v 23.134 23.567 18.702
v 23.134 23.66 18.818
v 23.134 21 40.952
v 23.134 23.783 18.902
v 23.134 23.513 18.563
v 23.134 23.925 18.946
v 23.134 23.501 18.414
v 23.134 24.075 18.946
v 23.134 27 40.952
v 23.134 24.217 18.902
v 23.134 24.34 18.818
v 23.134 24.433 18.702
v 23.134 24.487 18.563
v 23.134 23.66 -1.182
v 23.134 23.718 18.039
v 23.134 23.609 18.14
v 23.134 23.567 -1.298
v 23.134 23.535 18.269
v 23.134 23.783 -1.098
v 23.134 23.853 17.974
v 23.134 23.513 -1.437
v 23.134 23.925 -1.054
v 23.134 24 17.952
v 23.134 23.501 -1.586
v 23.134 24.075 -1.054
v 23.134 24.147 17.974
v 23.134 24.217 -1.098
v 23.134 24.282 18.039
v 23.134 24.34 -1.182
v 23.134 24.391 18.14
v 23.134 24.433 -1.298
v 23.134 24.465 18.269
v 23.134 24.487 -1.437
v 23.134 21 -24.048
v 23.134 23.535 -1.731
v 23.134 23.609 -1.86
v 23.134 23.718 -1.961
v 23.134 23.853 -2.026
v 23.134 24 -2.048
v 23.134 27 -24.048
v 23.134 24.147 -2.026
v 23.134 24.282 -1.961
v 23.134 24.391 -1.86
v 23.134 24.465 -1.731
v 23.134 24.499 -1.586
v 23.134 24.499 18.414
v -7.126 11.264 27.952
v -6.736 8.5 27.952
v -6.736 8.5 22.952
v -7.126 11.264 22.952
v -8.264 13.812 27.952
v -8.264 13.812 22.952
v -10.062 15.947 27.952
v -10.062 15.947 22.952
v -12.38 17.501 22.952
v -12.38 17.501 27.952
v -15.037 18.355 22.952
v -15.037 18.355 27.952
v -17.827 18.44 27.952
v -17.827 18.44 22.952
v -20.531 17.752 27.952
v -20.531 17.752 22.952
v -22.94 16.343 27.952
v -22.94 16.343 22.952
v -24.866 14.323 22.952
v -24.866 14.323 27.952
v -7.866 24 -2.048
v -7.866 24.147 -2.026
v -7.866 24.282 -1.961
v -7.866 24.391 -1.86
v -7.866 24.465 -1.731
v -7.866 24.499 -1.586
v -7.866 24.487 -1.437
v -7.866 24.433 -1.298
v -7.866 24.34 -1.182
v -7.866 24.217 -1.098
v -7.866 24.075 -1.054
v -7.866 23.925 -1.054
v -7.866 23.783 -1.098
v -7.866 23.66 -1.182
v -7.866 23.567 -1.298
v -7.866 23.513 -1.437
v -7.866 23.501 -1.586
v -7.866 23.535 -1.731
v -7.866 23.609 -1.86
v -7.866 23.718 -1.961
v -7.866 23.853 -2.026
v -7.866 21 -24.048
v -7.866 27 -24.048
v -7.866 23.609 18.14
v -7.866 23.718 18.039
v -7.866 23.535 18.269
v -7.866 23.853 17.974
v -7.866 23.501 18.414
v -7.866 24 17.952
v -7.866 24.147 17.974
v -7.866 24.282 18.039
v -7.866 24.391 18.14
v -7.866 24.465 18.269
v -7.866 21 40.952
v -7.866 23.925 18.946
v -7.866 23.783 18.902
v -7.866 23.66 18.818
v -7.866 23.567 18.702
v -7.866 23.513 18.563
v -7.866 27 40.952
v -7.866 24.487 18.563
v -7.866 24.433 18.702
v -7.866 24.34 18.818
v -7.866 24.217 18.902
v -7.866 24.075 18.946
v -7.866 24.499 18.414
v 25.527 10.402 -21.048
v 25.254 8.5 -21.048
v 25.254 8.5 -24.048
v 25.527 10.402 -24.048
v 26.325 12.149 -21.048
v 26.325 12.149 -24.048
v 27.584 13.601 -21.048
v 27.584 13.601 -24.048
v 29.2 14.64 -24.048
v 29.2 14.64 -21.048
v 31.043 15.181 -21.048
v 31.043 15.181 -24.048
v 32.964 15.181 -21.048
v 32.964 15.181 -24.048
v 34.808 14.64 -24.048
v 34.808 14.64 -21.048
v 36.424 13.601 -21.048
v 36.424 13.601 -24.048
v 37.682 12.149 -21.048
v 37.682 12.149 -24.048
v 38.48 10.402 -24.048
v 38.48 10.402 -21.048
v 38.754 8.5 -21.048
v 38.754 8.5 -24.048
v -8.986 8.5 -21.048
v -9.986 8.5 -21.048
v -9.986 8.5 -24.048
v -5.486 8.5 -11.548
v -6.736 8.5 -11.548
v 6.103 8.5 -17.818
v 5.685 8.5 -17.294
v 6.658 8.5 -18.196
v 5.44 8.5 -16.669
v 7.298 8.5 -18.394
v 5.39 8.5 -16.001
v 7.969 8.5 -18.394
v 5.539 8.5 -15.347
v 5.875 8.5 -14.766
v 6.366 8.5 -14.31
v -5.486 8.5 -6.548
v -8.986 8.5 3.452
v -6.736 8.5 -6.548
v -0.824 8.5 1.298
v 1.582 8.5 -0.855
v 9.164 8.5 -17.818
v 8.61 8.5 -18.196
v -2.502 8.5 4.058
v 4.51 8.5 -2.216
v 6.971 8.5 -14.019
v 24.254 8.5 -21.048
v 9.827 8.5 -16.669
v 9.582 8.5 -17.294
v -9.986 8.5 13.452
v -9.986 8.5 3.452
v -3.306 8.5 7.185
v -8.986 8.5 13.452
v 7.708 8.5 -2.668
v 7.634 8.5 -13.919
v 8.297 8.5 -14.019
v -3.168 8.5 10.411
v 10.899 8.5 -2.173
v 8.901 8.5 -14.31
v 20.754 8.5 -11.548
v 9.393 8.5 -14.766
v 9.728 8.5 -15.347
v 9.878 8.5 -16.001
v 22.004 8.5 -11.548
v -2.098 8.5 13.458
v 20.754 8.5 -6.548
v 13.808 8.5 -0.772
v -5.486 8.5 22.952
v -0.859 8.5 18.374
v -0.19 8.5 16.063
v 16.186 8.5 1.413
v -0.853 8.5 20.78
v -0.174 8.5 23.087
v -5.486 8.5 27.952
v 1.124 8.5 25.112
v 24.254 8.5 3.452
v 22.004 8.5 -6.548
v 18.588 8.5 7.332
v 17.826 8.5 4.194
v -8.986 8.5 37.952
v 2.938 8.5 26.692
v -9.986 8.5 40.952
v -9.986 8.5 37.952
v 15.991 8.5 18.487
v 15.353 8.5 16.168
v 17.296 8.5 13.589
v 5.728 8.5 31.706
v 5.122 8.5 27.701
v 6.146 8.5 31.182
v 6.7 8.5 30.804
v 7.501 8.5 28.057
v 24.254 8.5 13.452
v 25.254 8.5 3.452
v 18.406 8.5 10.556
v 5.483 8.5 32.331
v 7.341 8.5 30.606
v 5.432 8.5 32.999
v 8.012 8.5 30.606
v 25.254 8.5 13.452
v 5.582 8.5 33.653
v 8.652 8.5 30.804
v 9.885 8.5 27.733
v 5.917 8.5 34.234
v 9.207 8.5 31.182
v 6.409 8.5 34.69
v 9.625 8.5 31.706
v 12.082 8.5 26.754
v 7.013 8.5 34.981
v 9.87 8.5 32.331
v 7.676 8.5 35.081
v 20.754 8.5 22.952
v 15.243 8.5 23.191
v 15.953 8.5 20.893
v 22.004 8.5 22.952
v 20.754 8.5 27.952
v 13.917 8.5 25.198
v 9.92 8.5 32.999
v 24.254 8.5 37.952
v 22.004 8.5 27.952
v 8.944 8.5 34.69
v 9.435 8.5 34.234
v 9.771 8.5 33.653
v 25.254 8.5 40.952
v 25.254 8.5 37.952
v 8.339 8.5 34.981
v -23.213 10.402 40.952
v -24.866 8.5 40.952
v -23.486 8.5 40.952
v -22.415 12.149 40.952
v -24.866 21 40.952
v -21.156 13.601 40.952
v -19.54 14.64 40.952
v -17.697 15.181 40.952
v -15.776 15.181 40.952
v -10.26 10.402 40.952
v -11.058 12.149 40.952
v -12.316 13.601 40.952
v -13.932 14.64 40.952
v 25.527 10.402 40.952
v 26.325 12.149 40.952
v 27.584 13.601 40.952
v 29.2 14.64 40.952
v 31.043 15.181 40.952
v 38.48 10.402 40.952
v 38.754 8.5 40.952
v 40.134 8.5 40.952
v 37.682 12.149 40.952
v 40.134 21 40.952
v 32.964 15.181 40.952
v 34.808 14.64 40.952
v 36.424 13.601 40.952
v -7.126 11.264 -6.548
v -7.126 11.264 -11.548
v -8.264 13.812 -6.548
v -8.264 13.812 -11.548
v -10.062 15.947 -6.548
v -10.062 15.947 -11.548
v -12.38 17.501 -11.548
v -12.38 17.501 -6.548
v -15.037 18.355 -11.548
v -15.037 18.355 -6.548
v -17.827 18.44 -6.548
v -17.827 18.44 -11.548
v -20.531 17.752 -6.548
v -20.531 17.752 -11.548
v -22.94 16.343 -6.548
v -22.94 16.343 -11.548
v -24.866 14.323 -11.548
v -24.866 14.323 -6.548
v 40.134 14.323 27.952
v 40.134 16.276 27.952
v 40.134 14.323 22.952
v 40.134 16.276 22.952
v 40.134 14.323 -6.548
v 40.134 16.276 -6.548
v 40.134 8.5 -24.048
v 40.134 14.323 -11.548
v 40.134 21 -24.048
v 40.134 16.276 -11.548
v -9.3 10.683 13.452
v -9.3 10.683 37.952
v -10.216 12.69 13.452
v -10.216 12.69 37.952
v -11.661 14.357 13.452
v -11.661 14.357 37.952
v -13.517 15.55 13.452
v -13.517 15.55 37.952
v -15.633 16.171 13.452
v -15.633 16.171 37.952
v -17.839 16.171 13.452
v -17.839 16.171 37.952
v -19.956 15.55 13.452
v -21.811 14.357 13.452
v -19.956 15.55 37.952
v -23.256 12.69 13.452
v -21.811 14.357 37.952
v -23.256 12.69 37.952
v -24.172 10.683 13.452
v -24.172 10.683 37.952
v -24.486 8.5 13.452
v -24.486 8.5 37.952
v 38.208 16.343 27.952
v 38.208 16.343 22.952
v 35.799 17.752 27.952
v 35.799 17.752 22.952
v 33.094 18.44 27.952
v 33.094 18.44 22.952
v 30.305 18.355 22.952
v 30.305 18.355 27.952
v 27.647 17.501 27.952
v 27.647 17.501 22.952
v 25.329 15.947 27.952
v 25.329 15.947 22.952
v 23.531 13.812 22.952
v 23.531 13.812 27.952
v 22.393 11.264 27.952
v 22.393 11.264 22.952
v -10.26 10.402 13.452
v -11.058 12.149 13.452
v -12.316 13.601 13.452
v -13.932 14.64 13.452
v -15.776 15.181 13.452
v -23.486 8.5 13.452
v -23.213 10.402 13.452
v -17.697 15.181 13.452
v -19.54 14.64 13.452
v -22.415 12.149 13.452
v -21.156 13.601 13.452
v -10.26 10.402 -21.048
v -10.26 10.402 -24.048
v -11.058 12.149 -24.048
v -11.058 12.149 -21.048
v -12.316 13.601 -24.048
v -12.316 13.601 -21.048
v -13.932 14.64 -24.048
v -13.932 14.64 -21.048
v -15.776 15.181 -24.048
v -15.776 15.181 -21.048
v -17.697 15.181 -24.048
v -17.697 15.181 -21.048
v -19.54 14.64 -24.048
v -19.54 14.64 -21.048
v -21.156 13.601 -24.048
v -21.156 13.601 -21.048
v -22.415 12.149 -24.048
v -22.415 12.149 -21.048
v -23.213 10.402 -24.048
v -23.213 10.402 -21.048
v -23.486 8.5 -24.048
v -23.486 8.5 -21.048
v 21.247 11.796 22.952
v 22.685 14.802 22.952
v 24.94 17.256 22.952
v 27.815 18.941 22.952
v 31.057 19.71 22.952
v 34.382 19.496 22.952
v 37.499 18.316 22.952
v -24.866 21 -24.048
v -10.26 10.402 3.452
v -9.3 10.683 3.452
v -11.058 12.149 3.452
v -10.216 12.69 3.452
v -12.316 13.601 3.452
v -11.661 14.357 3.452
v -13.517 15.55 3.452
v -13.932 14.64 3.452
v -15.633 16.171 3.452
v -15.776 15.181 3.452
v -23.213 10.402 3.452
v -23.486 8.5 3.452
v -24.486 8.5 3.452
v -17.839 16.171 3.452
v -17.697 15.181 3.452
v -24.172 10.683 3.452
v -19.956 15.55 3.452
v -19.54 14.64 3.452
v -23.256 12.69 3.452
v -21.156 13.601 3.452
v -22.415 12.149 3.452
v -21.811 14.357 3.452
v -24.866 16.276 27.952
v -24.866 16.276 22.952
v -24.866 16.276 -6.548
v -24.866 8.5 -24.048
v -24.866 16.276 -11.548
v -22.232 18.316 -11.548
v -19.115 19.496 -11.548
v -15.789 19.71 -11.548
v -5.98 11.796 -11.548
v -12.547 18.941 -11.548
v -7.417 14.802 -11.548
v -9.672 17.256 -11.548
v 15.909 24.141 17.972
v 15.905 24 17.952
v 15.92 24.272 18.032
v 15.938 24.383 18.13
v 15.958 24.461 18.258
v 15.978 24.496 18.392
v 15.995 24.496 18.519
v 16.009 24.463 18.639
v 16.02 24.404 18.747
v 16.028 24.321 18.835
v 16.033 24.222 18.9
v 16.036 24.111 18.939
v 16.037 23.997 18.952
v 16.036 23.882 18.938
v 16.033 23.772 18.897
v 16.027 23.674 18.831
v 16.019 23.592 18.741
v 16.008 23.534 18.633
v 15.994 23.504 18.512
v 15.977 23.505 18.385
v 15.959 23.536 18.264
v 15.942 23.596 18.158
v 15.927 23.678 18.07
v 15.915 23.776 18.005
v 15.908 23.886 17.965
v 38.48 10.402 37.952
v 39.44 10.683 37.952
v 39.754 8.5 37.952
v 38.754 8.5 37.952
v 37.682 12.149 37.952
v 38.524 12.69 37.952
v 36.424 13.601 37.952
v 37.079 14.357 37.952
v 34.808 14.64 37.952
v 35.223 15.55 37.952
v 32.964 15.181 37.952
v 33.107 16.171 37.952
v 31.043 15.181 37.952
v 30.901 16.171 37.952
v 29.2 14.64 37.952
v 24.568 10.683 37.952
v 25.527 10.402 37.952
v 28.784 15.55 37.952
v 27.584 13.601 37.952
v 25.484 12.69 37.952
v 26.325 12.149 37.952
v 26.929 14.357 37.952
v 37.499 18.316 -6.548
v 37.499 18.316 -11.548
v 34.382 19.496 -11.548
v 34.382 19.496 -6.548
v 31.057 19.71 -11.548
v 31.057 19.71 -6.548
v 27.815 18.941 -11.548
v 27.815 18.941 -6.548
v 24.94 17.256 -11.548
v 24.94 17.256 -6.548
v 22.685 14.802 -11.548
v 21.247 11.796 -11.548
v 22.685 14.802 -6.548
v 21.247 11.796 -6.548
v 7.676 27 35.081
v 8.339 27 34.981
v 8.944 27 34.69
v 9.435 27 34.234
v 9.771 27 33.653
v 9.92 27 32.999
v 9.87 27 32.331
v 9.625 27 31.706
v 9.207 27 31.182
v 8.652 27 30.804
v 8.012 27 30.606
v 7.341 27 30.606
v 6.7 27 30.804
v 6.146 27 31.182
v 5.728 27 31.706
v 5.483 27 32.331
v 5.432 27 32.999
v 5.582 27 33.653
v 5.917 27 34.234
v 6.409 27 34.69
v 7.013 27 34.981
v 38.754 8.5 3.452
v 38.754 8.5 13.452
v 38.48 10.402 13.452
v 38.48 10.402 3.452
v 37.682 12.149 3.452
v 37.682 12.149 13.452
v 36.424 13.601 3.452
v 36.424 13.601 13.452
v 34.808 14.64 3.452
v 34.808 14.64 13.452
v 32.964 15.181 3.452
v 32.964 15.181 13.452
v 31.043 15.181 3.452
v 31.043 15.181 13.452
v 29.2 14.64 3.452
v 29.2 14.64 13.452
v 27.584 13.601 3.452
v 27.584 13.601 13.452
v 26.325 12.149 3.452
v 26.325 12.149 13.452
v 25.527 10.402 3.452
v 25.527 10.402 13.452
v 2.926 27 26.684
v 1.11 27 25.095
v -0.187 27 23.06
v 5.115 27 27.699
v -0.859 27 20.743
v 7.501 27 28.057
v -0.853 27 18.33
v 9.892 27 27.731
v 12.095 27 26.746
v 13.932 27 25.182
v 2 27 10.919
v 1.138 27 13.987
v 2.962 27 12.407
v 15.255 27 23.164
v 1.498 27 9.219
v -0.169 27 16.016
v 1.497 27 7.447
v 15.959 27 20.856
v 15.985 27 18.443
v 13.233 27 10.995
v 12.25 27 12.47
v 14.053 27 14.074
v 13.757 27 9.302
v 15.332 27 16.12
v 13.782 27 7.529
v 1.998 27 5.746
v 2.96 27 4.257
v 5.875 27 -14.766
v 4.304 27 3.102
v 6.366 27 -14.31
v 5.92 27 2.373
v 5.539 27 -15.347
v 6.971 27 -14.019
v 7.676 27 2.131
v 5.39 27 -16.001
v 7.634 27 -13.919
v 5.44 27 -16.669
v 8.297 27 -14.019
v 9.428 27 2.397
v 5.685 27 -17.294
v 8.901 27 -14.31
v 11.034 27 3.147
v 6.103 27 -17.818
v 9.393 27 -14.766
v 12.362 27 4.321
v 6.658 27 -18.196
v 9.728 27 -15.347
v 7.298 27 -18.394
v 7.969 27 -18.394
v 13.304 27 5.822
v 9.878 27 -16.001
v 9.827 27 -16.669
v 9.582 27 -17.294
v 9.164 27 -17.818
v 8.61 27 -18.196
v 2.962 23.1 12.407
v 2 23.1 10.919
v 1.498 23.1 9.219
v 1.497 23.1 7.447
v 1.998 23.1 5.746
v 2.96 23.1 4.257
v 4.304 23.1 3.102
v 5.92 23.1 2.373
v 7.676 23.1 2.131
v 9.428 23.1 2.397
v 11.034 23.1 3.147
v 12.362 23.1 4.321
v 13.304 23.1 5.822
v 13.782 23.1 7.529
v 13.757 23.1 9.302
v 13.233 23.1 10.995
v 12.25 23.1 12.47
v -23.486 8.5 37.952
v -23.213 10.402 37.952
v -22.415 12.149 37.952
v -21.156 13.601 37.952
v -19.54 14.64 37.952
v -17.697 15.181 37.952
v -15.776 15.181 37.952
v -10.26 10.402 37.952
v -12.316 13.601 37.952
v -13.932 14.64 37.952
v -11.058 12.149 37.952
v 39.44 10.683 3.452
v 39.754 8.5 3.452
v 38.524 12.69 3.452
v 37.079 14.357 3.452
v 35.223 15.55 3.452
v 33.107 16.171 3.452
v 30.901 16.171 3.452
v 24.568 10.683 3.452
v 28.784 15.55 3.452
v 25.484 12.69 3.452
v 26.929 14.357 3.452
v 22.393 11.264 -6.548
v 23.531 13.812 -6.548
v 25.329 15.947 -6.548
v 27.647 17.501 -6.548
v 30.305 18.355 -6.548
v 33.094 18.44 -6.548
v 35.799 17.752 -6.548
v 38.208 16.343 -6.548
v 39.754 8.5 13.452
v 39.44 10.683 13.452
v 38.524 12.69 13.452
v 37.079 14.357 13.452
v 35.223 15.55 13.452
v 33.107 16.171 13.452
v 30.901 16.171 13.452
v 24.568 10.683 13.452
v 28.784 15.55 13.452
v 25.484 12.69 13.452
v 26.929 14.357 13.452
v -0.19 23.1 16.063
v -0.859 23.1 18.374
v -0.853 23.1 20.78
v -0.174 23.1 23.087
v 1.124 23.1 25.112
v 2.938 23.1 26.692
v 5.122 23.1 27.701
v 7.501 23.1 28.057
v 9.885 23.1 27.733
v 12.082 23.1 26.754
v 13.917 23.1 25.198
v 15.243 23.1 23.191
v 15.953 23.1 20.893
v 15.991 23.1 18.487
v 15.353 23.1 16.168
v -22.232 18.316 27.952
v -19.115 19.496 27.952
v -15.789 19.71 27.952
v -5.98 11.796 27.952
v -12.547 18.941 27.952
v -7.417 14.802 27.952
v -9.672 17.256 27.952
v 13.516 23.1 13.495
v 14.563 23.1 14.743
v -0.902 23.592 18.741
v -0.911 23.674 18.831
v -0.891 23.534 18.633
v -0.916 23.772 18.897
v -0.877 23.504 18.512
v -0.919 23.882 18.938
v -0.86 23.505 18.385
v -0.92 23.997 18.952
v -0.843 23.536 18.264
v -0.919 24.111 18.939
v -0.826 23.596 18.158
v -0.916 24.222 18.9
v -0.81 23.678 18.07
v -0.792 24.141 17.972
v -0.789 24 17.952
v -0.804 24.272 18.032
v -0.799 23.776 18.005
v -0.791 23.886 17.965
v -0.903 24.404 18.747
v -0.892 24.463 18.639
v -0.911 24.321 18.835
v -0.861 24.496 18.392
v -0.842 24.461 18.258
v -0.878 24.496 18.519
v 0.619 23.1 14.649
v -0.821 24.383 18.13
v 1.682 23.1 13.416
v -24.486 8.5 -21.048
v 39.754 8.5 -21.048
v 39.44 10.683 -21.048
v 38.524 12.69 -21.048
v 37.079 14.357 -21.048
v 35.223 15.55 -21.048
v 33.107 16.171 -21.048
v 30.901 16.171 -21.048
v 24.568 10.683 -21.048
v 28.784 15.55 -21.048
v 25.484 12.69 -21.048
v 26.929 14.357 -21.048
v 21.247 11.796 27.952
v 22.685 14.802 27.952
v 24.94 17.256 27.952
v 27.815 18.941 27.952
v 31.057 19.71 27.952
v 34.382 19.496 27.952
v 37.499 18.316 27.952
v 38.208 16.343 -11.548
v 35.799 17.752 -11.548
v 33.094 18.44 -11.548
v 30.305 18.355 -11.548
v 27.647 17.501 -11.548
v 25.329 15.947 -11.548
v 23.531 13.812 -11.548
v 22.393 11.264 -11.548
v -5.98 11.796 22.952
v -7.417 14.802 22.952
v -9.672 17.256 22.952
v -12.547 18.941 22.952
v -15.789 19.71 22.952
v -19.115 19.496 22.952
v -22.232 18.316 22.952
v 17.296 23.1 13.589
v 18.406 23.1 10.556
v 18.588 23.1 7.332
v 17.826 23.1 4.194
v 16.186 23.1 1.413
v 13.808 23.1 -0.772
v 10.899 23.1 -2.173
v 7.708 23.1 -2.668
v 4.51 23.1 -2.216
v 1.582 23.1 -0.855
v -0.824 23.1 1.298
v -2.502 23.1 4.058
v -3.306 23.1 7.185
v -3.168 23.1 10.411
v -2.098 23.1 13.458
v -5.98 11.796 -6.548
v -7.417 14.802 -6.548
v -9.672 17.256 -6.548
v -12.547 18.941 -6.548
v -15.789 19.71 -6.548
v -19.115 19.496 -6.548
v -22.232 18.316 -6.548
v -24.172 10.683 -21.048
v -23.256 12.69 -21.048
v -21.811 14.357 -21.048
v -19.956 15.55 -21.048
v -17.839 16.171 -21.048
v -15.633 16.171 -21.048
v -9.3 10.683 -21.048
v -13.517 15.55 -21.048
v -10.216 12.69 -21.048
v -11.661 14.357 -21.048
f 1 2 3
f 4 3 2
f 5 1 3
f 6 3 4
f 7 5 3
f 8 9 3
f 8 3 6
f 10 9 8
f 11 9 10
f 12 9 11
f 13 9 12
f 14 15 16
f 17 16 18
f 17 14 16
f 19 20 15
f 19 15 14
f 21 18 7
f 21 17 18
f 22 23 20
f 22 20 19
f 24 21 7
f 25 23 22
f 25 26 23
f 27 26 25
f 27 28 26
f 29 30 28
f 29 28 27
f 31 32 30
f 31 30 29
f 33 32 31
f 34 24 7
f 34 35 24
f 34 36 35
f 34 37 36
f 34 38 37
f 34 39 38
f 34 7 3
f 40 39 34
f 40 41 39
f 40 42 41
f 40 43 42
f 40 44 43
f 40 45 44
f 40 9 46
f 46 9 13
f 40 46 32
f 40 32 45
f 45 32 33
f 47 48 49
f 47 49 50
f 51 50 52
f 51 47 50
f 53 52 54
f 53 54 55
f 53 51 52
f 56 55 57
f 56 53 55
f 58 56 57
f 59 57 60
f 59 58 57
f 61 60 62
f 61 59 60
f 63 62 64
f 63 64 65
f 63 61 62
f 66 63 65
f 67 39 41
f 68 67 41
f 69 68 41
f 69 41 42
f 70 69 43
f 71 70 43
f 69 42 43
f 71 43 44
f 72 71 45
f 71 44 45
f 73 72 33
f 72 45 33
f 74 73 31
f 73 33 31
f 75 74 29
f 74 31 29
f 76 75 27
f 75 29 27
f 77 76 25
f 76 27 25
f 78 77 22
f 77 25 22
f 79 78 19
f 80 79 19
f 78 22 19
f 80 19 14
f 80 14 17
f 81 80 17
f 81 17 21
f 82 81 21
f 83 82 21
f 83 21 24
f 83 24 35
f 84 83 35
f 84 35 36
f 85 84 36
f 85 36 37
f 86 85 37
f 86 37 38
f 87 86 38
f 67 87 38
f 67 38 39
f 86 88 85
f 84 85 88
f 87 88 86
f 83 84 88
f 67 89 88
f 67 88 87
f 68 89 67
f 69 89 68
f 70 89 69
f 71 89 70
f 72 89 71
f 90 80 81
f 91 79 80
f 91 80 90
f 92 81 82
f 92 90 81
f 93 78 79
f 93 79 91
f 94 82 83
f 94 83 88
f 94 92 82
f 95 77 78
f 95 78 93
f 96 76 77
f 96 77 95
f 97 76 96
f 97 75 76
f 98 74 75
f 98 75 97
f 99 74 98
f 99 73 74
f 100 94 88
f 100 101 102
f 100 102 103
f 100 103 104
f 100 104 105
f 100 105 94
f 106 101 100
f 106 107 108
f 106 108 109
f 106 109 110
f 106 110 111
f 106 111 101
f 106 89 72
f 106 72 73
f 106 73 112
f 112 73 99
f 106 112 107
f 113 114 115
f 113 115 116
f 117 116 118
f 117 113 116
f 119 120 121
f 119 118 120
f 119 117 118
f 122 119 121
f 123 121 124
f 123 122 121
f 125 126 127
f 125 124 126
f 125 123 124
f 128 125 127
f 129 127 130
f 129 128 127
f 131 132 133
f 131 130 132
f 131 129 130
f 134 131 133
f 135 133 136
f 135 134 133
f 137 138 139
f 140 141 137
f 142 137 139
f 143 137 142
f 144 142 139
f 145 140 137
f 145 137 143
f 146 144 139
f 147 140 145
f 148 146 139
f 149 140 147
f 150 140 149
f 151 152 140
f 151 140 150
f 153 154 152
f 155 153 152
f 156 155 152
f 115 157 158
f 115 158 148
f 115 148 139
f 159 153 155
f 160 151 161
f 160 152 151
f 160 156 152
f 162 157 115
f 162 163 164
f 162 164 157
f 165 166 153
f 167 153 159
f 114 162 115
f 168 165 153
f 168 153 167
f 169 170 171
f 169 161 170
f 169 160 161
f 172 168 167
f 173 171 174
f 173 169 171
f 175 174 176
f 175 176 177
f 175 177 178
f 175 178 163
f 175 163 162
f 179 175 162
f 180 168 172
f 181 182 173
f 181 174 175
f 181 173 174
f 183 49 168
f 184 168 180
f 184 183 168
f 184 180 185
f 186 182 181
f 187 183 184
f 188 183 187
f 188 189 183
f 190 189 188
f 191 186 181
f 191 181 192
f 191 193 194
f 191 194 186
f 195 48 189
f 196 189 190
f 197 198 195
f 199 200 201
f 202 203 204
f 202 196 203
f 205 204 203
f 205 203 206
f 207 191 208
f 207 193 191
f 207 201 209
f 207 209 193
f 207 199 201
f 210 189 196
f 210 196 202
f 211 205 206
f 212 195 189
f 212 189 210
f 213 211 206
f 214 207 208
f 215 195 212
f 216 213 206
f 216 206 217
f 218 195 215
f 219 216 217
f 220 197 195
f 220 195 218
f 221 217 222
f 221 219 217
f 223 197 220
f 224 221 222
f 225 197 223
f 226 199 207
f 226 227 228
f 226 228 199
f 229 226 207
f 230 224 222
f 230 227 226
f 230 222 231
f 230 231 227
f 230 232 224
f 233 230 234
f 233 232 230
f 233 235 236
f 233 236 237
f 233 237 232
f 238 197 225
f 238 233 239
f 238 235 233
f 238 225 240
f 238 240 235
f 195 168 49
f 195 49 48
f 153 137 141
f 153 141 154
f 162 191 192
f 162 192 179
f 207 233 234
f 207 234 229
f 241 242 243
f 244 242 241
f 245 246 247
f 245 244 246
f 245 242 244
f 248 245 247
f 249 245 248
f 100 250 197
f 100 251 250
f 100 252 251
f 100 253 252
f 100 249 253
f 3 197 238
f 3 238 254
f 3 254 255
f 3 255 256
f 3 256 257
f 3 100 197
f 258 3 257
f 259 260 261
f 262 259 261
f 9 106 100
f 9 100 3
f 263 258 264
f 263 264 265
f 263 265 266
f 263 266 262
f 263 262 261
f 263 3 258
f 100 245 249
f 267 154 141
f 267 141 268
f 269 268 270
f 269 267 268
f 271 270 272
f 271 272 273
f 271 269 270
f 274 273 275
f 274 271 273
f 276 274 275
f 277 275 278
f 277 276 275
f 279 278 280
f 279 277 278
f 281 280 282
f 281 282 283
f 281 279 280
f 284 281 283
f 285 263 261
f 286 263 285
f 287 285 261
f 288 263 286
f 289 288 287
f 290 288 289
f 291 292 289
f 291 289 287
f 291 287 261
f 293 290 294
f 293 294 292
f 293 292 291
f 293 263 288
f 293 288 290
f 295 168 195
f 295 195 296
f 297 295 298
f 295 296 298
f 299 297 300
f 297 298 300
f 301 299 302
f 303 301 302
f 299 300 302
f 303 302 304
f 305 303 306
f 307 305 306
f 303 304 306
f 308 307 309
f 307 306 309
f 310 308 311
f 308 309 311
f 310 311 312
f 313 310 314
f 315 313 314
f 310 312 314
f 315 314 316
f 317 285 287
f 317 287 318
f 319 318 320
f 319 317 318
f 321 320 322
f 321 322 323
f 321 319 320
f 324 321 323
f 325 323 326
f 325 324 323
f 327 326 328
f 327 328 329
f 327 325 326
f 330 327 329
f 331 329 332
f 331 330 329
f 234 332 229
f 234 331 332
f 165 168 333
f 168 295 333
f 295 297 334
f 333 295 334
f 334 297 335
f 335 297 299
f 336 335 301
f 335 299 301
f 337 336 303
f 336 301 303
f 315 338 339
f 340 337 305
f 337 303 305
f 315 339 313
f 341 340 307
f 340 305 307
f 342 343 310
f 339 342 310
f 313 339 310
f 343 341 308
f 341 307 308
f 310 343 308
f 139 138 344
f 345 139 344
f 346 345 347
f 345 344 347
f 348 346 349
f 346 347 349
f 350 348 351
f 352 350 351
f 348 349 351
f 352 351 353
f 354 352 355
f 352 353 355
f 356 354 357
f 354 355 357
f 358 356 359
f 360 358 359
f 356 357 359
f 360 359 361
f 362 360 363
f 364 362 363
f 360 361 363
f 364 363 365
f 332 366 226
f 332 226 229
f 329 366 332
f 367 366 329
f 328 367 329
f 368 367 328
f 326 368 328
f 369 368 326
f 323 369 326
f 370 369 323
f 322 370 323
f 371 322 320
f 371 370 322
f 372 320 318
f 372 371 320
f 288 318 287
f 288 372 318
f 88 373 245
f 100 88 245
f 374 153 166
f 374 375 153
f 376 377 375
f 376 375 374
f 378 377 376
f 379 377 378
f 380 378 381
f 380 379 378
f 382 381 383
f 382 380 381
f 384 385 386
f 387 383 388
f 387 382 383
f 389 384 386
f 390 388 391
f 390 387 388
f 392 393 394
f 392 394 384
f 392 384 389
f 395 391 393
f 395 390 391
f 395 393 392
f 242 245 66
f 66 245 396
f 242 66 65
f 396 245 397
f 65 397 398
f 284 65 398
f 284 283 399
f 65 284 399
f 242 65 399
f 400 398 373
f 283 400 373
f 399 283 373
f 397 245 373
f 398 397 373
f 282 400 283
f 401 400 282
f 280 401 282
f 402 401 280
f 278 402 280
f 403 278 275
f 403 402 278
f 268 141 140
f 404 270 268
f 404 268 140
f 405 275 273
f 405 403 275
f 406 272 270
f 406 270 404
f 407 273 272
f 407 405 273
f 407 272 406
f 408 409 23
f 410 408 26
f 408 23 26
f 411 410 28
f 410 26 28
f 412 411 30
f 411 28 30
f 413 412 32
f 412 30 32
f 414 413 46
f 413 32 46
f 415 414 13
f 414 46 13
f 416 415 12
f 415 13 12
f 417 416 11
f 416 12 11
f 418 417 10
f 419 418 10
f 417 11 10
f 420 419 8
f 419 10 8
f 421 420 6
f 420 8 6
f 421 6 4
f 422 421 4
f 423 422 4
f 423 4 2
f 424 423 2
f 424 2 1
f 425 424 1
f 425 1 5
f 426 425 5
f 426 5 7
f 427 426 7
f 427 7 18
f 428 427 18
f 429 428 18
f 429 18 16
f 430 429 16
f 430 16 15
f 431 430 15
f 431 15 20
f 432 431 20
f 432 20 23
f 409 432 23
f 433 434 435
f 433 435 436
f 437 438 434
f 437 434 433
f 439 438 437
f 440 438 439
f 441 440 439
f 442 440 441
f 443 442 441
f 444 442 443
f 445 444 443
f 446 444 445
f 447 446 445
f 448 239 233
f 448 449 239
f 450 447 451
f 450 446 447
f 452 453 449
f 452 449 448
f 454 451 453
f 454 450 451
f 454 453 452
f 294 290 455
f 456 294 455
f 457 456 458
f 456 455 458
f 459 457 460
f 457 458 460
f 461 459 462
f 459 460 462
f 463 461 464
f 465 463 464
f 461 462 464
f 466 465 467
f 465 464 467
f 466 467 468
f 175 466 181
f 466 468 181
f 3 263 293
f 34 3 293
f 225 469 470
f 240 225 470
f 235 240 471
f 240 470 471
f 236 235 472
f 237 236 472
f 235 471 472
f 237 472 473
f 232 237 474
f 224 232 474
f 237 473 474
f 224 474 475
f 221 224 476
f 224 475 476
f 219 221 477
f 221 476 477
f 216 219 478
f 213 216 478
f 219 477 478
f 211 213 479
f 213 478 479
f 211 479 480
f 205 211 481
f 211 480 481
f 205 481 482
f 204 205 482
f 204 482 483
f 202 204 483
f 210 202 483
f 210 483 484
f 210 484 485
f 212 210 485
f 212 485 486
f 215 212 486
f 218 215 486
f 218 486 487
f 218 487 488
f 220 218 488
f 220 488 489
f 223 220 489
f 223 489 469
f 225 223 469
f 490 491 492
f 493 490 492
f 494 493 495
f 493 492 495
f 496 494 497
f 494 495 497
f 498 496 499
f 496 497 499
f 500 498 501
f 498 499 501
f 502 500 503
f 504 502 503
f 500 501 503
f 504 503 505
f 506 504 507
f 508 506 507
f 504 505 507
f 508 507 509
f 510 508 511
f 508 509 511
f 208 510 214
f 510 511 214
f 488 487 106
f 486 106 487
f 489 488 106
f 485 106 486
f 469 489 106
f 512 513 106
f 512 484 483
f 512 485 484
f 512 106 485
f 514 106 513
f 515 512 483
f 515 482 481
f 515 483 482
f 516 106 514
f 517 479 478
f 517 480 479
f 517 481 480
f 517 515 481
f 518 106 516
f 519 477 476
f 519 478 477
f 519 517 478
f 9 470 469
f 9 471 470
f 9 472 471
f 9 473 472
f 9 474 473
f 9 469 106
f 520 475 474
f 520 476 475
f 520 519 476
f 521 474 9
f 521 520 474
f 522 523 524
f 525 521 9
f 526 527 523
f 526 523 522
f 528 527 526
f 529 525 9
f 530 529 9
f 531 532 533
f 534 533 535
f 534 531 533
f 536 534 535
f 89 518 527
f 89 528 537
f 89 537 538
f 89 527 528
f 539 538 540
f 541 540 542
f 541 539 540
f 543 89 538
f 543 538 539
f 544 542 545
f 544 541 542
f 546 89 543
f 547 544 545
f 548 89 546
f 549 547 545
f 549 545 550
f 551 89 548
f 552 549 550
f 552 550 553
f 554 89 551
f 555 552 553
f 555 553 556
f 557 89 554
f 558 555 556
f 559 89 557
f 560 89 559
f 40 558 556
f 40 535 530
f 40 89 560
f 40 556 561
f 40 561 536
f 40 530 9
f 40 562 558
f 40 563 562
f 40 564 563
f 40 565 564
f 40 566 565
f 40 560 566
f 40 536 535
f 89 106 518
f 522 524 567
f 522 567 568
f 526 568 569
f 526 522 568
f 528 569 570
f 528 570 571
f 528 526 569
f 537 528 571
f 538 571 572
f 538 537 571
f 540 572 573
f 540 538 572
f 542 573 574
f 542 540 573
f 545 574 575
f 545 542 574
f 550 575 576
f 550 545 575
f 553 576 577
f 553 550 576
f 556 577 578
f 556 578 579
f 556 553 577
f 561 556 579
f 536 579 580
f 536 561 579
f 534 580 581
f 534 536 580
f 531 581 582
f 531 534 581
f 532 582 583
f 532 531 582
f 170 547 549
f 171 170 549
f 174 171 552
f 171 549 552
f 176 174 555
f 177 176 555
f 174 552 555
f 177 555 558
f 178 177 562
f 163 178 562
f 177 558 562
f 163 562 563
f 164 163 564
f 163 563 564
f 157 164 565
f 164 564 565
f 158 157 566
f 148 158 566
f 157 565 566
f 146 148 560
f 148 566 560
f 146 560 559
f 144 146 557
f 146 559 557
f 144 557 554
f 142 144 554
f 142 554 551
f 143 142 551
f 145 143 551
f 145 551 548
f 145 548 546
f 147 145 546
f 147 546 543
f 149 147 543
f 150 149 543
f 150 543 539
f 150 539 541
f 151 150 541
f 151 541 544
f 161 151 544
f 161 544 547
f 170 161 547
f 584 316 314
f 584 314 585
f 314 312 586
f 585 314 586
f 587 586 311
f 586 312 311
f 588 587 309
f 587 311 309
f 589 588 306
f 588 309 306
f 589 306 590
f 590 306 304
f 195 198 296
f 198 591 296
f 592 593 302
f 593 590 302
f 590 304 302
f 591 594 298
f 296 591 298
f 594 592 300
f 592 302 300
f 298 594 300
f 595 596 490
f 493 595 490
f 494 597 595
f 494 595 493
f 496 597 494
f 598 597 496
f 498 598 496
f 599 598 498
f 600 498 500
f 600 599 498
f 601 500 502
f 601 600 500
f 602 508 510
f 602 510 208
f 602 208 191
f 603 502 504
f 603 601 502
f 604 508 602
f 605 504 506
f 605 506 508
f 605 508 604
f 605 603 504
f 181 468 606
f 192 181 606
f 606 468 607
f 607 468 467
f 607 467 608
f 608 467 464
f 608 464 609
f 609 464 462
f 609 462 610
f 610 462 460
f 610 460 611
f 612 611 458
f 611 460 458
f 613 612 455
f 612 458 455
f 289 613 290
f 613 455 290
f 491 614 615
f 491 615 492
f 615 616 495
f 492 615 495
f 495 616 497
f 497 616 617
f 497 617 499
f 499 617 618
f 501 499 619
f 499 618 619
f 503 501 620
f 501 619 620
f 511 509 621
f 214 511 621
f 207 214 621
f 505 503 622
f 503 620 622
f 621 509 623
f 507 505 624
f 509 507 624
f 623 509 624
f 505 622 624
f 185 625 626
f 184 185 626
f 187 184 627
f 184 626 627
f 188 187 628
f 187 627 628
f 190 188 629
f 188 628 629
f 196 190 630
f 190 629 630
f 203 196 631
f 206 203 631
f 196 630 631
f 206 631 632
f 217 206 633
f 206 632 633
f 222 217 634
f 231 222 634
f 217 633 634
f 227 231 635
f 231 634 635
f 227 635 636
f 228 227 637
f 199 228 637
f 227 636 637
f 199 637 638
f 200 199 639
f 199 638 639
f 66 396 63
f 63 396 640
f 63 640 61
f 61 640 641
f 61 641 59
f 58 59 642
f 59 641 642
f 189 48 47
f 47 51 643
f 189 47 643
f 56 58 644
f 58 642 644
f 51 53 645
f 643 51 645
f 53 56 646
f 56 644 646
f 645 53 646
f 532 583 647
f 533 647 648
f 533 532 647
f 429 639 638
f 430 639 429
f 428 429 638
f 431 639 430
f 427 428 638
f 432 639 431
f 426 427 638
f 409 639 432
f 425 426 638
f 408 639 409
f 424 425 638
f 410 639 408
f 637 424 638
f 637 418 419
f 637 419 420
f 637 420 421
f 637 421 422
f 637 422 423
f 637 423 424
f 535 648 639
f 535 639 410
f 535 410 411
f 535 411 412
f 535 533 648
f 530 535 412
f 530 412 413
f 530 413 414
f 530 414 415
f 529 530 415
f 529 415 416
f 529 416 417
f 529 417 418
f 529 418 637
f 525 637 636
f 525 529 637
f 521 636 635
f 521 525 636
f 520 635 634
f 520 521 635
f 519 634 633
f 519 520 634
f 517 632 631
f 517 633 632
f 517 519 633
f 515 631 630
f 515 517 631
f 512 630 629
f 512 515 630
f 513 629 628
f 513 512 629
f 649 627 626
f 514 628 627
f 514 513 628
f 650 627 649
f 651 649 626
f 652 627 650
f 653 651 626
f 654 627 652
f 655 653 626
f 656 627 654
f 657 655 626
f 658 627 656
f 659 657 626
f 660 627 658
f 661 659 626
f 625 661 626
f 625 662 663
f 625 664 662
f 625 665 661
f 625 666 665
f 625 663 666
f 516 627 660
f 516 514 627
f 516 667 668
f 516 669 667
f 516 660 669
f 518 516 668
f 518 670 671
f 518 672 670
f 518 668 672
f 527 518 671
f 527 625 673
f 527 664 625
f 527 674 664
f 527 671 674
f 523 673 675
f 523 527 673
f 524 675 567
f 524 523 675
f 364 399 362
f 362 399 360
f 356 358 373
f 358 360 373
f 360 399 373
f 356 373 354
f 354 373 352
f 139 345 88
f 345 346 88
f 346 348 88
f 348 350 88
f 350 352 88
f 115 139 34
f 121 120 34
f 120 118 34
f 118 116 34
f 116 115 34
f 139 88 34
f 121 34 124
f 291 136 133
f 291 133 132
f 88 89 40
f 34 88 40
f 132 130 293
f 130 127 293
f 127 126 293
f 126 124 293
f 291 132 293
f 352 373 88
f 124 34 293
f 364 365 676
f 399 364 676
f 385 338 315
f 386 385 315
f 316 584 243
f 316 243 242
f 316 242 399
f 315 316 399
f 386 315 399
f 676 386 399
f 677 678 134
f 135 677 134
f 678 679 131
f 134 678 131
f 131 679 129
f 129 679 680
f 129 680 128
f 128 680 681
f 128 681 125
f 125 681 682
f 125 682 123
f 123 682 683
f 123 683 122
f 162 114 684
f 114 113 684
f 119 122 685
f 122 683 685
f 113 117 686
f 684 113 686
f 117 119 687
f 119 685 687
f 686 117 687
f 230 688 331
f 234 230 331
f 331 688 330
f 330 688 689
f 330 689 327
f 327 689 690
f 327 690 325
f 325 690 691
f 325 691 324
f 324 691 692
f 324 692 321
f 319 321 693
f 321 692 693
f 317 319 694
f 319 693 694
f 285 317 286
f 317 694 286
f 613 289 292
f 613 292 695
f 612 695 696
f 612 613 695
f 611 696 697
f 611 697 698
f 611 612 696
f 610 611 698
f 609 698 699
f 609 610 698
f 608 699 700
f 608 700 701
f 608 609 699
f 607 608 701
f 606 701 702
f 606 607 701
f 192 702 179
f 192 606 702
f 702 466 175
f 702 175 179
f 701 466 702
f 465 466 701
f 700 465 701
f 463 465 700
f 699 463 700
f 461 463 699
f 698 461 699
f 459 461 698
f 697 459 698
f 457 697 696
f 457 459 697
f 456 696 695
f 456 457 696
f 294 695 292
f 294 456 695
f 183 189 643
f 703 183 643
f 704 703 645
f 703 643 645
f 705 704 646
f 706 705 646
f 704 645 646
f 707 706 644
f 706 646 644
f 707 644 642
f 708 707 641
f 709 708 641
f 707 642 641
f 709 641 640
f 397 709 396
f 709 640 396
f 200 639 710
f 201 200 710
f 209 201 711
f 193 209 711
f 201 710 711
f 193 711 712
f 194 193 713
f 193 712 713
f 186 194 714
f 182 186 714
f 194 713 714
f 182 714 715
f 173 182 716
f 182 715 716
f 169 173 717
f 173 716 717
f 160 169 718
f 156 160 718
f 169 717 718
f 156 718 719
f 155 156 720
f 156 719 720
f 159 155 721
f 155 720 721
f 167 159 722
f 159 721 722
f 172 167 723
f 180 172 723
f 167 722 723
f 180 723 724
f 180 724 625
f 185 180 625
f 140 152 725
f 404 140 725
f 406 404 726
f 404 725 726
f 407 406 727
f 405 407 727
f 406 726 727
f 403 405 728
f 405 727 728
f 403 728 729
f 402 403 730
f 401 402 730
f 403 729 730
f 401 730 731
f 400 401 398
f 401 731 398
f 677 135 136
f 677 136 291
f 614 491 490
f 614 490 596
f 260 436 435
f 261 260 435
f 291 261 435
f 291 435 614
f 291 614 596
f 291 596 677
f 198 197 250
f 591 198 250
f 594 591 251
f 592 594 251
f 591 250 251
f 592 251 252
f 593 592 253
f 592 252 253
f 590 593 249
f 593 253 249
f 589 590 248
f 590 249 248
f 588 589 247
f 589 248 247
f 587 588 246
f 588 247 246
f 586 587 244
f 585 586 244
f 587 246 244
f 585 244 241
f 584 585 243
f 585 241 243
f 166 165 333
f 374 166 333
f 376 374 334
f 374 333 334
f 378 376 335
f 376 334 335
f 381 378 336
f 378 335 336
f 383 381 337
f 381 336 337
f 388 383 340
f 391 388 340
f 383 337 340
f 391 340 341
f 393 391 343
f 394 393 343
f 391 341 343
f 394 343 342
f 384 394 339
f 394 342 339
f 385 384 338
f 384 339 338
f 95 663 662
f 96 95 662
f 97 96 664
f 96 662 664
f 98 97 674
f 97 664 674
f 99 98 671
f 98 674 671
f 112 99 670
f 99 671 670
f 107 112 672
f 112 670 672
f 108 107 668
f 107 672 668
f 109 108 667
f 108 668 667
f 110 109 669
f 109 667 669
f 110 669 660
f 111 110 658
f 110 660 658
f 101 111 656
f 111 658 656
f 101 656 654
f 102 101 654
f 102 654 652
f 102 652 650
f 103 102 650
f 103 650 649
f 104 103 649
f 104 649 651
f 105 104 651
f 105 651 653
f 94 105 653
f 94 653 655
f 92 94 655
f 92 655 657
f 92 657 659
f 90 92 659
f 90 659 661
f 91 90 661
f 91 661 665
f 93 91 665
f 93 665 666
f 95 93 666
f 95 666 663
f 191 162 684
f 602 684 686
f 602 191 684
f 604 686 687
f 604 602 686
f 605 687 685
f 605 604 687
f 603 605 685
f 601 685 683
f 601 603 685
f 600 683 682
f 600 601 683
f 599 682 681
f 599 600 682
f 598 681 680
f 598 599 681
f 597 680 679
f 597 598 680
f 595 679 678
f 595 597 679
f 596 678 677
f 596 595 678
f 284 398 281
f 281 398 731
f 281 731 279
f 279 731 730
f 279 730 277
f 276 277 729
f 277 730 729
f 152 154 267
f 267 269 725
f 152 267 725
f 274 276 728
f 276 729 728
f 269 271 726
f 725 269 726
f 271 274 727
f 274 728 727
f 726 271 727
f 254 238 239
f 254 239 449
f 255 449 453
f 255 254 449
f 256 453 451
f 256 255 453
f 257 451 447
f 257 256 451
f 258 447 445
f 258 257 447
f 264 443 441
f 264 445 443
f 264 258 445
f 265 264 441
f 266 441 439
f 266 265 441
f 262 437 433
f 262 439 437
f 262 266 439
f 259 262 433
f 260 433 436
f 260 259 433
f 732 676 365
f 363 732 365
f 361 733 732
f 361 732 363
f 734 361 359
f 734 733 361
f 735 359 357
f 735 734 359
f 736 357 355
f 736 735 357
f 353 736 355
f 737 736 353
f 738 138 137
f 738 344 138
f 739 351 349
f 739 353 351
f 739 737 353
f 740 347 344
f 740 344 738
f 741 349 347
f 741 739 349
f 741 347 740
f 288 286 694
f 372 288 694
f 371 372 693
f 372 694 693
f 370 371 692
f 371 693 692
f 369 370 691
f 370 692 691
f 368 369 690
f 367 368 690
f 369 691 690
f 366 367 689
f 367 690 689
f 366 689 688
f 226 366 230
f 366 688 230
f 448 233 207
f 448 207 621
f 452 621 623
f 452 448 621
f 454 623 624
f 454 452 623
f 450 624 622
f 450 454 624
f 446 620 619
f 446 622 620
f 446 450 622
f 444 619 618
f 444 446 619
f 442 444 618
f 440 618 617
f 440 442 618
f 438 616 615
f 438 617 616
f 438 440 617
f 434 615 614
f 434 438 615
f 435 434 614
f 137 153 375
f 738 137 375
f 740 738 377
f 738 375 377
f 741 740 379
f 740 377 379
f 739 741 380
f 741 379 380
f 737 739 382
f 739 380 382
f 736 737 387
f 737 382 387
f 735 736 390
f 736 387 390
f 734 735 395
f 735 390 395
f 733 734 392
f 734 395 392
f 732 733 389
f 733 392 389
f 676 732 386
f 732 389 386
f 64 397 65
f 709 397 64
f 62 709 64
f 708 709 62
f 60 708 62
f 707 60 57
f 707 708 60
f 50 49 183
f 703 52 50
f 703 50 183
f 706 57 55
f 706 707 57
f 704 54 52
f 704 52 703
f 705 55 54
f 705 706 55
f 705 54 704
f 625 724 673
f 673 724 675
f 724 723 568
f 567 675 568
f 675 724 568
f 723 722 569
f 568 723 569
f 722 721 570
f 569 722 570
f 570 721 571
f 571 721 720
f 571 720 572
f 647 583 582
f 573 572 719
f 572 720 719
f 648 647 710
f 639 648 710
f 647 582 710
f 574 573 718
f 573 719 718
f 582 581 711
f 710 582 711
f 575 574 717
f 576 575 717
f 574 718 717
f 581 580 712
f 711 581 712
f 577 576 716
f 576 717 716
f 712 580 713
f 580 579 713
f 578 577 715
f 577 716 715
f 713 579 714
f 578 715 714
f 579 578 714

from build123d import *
from build123d.topology import SkipClean

# Parameters (mm, degrees)
SKETCH_1_W           = 65
SKETCH_1_H           = 65
EXTRUDE_1_DEPTH      = 17
CUT_EXTRUDE_1_DEPTH  = 59
CUT_EXTRUDE_2_DEPTH  = 79.260612028
EXTRUDE_2_DEPTH      = 10
SKETCH_12_W          = 35.24
SKETCH_12_H          = 8.5
CUT_EXTRUDE_5_DEPTH  = 79.260612028
SKETCH_17_R          = 2.25
CUT_EXTRUDE_8_DEPTH  = 58.965697588
EXTRUDE_START        = 10
SKETCH_18_W          = 65
SKETCH_18_H          = 65
SKETCH_18_R          = 2.25
EXTRUDE_3_DEPTH      = 10
CUT_EXTRUDE_START    = -10
SKETCH_9_R           = 11.25
SKETCH_9_R_2         = 10
CUT_EXTRUDE_3_DEPTH  = 5
CUT_EXTRUDE_START_2  = -20
SKETCH_10_R          = 11.25
SKETCH_10_R_2        = 10
CUT_EXTRUDE_4_DEPTH  = 5
SKETCH_19_W          = 65
SKETCH_19_H          = 6
CUT_EXTRUDE_9_DEPTH  = 17
SKETCH_20_W          = 65
SKETCH_20_H          = 6
CUT_EXTRUDE_10_DEPTH = 17
SKETCH_21_R          = 0.5
CUT_EXTRUDE_11_DEPTH = 69.629794564
CUT_EXTRUDE_12_DEPTH = 3.9
CUT_EXTRUDE_13_DEPTH = 60.168674963


with BuildPart() as part:
    # Эскиз1 → Бобышка-Вытянуть1 (new body)
    with BuildSketch(Plane(origin=(0, 0, 0), x_dir=(1, 0, 0), z_dir=(0, 1, 0))):
        with Locations((7.633818594, -8.451785088)):
            Rectangle(SKETCH_1_W, SKETCH_1_H)
    extrude(amount=EXTRUDE_1_DEPTH)

    # Эскиз3 → Вырез-Вытянуть1 (cut)
    with BuildSketch(Plane.XY.offset(37.951785088)):
        with BuildLine():
            Line((39.753818594, 8.5), (40.133818594, 8.5))
            Line((40.133818594, 8.5), (40.133818594, 0))
            Line((40.133818594, 0), (24.253818594, 0))
            Line((24.253818594, 0), (24.253818594, 8.5))
            ThreePointArc((24.253818594, 8.5), (32.003818594, 16.25), (39.753818594, 8.5))
        make_face()
        with BuildLine():
            Line((-24.486181406, 8.5), (-24.866181406, 8.5))
            Line((-24.866181406, 8.5), (-24.866181406, 0))
            Line((-24.866181406, 0), (-8.986181406, 0))
            Line((-8.986181406, 0), (-8.986181406, 8.5))
            ThreePointArc((-8.986181406, 8.5), (-16.736181406, 16.25), (-24.486181406, 8.5))
        make_face()
    extrude(amount=-CUT_EXTRUDE_1_DEPTH, mode=Mode.SUBTRACT)

    # Эскиз5 → Вырез-Вытянуть2 (cut, through all)
    with BuildSketch(Plane.XY.offset(40.951785088)):
        with BuildLine():
            Line((-23.486181406, 8.5), (-24.866181406, 8.5))
            Line((-24.866181406, 8.5), (-24.866181406, 0))
            Line((-24.866181406, 0), (-9.986181406, 0))
            Line((-9.986181406, 0), (-9.986181406, 8.5))
            ThreePointArc((-9.986181406, 8.5), (-16.736181406, 15.25), (-23.486181406, 8.5))
        make_face()
        with BuildLine():
            Line((38.753818594, 8.5), (40.133818594, 8.5))
            Line((40.133818594, 8.5), (40.133818594, 0))
            Line((40.133818594, 0), (25.253818594, 0))
            Line((25.253818594, 0), (25.253818594, 8.5))
            ThreePointArc((25.253818594, 8.5), (32.003818594, 15.25), (38.753818594, 8.5))
        make_face()
    extrude(amount=-CUT_EXTRUDE_2_DEPTH, mode=Mode.SUBTRACT)

    # Эскиз6 → Бобышка-Вытянуть2 (add)
    with BuildSketch(Plane.XY.offset(13.451785088)):
        with BuildLine():
            Line((-23.486181406, 8.5), (-24.866181406, 8.5))
            Line((-24.866181406, 8.5), (-24.866181406, 17))
            Line((-24.866181406, 17), (-9.986181406, 17))
            Line((-9.986181406, 17), (40.133818594, 17))
            Line((40.133818594, 17), (40.133818594, 8.5))
            Line((40.133818594, 8.5), (38.753818594, 8.5))
            ThreePointArc((38.753818594, 8.5), (32.003818594, 15.25), (25.253818594, 8.5))
            Line((25.253818594, 8.5), (25.253818594, 0))
            Line((25.253818594, 0), (-9.986181406, 0))
            Line((-9.986181406, 0), (-9.986181406, 8.5))
            ThreePointArc((-9.986181406, 8.5), (-16.736181406, 15.25), (-23.486181406, 8.5))
        make_face()
    extrude(amount=-EXTRUDE_2_DEPTH)

    # Эскиз12 → Вырез-Вытянуть5 (cut, through all)
    with BuildSketch(Plane.XY.offset(40.951785088)):
        with Locations((7.633818594, 4.25)):
            Rectangle(SKETCH_12_W, SKETCH_12_H)
    extrude(amount=-CUT_EXTRUDE_5_DEPTH, mode=Mode.SUBTRACT)

    # Эскиз17 → Вырез-Вытянуть8 (cut, through all)
    with BuildSketch(Plane(origin=(0, 17, 0), x_dir=(1, 0, 0), z_dir=(0, 1, 0))):
        with Locations(Location((7.633818594, 16.168732948, 0), (0, 0, 270))):
            Circle(SKETCH_17_R)
        with Locations(Location((7.676184998, -32.831267052, 0), (0, 0, 270))):
            Circle(SKETCH_17_R)
    extrude(amount=-CUT_EXTRUDE_8_DEPTH, mode=Mode.SUBTRACT)

    # Эскиз18 → Бобышка-Вытянуть3 (add)
    with BuildSketch(Plane(origin=(0, 17, 0), x_dir=(1, 0, 0), z_dir=(0, 1, 0)).offset(EXTRUDE_START)):
        with Locations((7.633818594, -8.451785088)):
            Rectangle(SKETCH_18_W, SKETCH_18_H)
        with Locations(Location((7.633818594, 16.168732948, 0), (0, 0, 270))):
            Circle(SKETCH_18_R, mode=Mode.SUBTRACT)
        with Locations(Location((7.676184998, -32.831267052, 0), (0, 0, 270))):
            Circle(SKETCH_18_R, mode=Mode.SUBTRACT)
    extrude(amount=-EXTRUDE_3_DEPTH)

    # Эскиз9 → Вырез-Вытянуть3 (cut)
    # profile 1 of 2: a face of its own
    with BuildSketch(Plane.XY.offset(37.951785088).offset(CUT_EXTRUDE_START)):
        with Locations((-16.736181406, 8.5)):
            Circle(SKETCH_9_R)
        with Locations((-16.736181406, 8.5)):
            Circle(SKETCH_9_R_2, mode=Mode.SUBTRACT)
    # profile 2 of 2: a face of its own
    with BuildSketch(Plane.XY.offset(37.951785088).offset(CUT_EXTRUDE_START)):
        with Locations((32.003818594, 8.5)):
            Circle(SKETCH_9_R)
        with Locations((32.003818594, 8.5)):
            Circle(SKETCH_9_R_2, mode=Mode.SUBTRACT)
    extrude(amount=-CUT_EXTRUDE_3_DEPTH, mode=Mode.SUBTRACT)

    # Эскиз10 → Вырез-Вытянуть4 (cut)
    # profile 1 of 2: a face of its own
    with BuildSketch(Plane.XY.offset(13.451785088).offset(CUT_EXTRUDE_START_2)):
        with Locations((-16.736181406, 8.5)):
            Circle(SKETCH_10_R)
        with Locations((-16.736181406, 8.5)):
            Circle(SKETCH_10_R_2, mode=Mode.SUBTRACT)
    # profile 2 of 2: a face of its own
    with BuildSketch(Plane.XY.offset(13.451785088).offset(CUT_EXTRUDE_START_2)):
        with Locations((32.003818594, 8.5)):
            Circle(SKETCH_10_R)
        with Locations((32.003818594, 8.5)):
            Circle(SKETCH_10_R_2, mode=Mode.SUBTRACT)
    extrude(amount=-CUT_EXTRUDE_4_DEPTH, mode=Mode.SUBTRACT)

    # Эскиз19 → Вырез-Вытянуть9 (cut)
    with BuildSketch(Plane(origin=(40.133818594, 0, 0), x_dir=(0, 0, -1), z_dir=(1, 0, 0))):
        with Locations((-8.451785088, 24)):
            Rectangle(SKETCH_19_W, SKETCH_19_H)
    extrude(amount=-CUT_EXTRUDE_9_DEPTH, mode=Mode.SUBTRACT)

    # Эскиз20 → Вырез-Вытянуть10 (cut)
    with BuildSketch(Plane.ZY.offset(24.866181406)):
        with Locations((8.451785088, 24)):
            Rectangle(SKETCH_20_W, SKETCH_20_H)
    extrude(amount=-CUT_EXTRUDE_10_DEPTH, mode=Mode.SUBTRACT)

    # Эскиз21 → Вырез-Вытянуть11 (cut, through all)
    with BuildSketch(Plane(origin=(23.133818594, 0, 0), x_dir=(0, 0, -1), z_dir=(1, 0, 0))):
        with Locations((-18.451785088, 24)):
            Circle(SKETCH_21_R)
        with Locations((1.548214912, 24)):
            Circle(SKETCH_21_R)
    extrude(amount=-CUT_EXTRUDE_11_DEPTH, mode=Mode.SUBTRACT)

    # Эскиз13 → Вырез-Вытянуть12 (cut)
    with BuildSketch(Plane.XZ.offset(-27)):
        with BuildLine():
            ThreePointArc((2.962122683, 12.40744876), (7.675512515, 2.131407246), (12.250269981, 12.469911346))
            ThreePointArc((12.250269981, 12.469911346), (7.501160594, 28.057428262), (2.962122683, 12.40744876))
        make_face()
    extrude(amount=CUT_EXTRUDE_12_DEPTH, mode=Mode.SUBTRACT)

    # Эскиз24 → Вырез-Вытянуть13 (cut, through all)
    with SkipClean():  # the faces are left unmerged after this step: merging them gives an invalid solid
        with BuildSketch(Plane(origin=(0, 23.1, 0), x_dir=(1, 0, 0), z_dir=(0, 1, 0))):
            with BuildLine():
                ThreePointArc((-0.190214084, -16.063311585), (7.501160594, -28.057428262), (15.353152659, -16.167840384))
                ThreePointArc((15.353152659, -16.167840384), (7.707791679, 2.668484217), (-0.190214084, -16.063311585))
            make_face()
        extrude(amount=-CUT_EXTRUDE_13_DEPTH, mode=Mode.SUBTRACT)


solid = part.part
